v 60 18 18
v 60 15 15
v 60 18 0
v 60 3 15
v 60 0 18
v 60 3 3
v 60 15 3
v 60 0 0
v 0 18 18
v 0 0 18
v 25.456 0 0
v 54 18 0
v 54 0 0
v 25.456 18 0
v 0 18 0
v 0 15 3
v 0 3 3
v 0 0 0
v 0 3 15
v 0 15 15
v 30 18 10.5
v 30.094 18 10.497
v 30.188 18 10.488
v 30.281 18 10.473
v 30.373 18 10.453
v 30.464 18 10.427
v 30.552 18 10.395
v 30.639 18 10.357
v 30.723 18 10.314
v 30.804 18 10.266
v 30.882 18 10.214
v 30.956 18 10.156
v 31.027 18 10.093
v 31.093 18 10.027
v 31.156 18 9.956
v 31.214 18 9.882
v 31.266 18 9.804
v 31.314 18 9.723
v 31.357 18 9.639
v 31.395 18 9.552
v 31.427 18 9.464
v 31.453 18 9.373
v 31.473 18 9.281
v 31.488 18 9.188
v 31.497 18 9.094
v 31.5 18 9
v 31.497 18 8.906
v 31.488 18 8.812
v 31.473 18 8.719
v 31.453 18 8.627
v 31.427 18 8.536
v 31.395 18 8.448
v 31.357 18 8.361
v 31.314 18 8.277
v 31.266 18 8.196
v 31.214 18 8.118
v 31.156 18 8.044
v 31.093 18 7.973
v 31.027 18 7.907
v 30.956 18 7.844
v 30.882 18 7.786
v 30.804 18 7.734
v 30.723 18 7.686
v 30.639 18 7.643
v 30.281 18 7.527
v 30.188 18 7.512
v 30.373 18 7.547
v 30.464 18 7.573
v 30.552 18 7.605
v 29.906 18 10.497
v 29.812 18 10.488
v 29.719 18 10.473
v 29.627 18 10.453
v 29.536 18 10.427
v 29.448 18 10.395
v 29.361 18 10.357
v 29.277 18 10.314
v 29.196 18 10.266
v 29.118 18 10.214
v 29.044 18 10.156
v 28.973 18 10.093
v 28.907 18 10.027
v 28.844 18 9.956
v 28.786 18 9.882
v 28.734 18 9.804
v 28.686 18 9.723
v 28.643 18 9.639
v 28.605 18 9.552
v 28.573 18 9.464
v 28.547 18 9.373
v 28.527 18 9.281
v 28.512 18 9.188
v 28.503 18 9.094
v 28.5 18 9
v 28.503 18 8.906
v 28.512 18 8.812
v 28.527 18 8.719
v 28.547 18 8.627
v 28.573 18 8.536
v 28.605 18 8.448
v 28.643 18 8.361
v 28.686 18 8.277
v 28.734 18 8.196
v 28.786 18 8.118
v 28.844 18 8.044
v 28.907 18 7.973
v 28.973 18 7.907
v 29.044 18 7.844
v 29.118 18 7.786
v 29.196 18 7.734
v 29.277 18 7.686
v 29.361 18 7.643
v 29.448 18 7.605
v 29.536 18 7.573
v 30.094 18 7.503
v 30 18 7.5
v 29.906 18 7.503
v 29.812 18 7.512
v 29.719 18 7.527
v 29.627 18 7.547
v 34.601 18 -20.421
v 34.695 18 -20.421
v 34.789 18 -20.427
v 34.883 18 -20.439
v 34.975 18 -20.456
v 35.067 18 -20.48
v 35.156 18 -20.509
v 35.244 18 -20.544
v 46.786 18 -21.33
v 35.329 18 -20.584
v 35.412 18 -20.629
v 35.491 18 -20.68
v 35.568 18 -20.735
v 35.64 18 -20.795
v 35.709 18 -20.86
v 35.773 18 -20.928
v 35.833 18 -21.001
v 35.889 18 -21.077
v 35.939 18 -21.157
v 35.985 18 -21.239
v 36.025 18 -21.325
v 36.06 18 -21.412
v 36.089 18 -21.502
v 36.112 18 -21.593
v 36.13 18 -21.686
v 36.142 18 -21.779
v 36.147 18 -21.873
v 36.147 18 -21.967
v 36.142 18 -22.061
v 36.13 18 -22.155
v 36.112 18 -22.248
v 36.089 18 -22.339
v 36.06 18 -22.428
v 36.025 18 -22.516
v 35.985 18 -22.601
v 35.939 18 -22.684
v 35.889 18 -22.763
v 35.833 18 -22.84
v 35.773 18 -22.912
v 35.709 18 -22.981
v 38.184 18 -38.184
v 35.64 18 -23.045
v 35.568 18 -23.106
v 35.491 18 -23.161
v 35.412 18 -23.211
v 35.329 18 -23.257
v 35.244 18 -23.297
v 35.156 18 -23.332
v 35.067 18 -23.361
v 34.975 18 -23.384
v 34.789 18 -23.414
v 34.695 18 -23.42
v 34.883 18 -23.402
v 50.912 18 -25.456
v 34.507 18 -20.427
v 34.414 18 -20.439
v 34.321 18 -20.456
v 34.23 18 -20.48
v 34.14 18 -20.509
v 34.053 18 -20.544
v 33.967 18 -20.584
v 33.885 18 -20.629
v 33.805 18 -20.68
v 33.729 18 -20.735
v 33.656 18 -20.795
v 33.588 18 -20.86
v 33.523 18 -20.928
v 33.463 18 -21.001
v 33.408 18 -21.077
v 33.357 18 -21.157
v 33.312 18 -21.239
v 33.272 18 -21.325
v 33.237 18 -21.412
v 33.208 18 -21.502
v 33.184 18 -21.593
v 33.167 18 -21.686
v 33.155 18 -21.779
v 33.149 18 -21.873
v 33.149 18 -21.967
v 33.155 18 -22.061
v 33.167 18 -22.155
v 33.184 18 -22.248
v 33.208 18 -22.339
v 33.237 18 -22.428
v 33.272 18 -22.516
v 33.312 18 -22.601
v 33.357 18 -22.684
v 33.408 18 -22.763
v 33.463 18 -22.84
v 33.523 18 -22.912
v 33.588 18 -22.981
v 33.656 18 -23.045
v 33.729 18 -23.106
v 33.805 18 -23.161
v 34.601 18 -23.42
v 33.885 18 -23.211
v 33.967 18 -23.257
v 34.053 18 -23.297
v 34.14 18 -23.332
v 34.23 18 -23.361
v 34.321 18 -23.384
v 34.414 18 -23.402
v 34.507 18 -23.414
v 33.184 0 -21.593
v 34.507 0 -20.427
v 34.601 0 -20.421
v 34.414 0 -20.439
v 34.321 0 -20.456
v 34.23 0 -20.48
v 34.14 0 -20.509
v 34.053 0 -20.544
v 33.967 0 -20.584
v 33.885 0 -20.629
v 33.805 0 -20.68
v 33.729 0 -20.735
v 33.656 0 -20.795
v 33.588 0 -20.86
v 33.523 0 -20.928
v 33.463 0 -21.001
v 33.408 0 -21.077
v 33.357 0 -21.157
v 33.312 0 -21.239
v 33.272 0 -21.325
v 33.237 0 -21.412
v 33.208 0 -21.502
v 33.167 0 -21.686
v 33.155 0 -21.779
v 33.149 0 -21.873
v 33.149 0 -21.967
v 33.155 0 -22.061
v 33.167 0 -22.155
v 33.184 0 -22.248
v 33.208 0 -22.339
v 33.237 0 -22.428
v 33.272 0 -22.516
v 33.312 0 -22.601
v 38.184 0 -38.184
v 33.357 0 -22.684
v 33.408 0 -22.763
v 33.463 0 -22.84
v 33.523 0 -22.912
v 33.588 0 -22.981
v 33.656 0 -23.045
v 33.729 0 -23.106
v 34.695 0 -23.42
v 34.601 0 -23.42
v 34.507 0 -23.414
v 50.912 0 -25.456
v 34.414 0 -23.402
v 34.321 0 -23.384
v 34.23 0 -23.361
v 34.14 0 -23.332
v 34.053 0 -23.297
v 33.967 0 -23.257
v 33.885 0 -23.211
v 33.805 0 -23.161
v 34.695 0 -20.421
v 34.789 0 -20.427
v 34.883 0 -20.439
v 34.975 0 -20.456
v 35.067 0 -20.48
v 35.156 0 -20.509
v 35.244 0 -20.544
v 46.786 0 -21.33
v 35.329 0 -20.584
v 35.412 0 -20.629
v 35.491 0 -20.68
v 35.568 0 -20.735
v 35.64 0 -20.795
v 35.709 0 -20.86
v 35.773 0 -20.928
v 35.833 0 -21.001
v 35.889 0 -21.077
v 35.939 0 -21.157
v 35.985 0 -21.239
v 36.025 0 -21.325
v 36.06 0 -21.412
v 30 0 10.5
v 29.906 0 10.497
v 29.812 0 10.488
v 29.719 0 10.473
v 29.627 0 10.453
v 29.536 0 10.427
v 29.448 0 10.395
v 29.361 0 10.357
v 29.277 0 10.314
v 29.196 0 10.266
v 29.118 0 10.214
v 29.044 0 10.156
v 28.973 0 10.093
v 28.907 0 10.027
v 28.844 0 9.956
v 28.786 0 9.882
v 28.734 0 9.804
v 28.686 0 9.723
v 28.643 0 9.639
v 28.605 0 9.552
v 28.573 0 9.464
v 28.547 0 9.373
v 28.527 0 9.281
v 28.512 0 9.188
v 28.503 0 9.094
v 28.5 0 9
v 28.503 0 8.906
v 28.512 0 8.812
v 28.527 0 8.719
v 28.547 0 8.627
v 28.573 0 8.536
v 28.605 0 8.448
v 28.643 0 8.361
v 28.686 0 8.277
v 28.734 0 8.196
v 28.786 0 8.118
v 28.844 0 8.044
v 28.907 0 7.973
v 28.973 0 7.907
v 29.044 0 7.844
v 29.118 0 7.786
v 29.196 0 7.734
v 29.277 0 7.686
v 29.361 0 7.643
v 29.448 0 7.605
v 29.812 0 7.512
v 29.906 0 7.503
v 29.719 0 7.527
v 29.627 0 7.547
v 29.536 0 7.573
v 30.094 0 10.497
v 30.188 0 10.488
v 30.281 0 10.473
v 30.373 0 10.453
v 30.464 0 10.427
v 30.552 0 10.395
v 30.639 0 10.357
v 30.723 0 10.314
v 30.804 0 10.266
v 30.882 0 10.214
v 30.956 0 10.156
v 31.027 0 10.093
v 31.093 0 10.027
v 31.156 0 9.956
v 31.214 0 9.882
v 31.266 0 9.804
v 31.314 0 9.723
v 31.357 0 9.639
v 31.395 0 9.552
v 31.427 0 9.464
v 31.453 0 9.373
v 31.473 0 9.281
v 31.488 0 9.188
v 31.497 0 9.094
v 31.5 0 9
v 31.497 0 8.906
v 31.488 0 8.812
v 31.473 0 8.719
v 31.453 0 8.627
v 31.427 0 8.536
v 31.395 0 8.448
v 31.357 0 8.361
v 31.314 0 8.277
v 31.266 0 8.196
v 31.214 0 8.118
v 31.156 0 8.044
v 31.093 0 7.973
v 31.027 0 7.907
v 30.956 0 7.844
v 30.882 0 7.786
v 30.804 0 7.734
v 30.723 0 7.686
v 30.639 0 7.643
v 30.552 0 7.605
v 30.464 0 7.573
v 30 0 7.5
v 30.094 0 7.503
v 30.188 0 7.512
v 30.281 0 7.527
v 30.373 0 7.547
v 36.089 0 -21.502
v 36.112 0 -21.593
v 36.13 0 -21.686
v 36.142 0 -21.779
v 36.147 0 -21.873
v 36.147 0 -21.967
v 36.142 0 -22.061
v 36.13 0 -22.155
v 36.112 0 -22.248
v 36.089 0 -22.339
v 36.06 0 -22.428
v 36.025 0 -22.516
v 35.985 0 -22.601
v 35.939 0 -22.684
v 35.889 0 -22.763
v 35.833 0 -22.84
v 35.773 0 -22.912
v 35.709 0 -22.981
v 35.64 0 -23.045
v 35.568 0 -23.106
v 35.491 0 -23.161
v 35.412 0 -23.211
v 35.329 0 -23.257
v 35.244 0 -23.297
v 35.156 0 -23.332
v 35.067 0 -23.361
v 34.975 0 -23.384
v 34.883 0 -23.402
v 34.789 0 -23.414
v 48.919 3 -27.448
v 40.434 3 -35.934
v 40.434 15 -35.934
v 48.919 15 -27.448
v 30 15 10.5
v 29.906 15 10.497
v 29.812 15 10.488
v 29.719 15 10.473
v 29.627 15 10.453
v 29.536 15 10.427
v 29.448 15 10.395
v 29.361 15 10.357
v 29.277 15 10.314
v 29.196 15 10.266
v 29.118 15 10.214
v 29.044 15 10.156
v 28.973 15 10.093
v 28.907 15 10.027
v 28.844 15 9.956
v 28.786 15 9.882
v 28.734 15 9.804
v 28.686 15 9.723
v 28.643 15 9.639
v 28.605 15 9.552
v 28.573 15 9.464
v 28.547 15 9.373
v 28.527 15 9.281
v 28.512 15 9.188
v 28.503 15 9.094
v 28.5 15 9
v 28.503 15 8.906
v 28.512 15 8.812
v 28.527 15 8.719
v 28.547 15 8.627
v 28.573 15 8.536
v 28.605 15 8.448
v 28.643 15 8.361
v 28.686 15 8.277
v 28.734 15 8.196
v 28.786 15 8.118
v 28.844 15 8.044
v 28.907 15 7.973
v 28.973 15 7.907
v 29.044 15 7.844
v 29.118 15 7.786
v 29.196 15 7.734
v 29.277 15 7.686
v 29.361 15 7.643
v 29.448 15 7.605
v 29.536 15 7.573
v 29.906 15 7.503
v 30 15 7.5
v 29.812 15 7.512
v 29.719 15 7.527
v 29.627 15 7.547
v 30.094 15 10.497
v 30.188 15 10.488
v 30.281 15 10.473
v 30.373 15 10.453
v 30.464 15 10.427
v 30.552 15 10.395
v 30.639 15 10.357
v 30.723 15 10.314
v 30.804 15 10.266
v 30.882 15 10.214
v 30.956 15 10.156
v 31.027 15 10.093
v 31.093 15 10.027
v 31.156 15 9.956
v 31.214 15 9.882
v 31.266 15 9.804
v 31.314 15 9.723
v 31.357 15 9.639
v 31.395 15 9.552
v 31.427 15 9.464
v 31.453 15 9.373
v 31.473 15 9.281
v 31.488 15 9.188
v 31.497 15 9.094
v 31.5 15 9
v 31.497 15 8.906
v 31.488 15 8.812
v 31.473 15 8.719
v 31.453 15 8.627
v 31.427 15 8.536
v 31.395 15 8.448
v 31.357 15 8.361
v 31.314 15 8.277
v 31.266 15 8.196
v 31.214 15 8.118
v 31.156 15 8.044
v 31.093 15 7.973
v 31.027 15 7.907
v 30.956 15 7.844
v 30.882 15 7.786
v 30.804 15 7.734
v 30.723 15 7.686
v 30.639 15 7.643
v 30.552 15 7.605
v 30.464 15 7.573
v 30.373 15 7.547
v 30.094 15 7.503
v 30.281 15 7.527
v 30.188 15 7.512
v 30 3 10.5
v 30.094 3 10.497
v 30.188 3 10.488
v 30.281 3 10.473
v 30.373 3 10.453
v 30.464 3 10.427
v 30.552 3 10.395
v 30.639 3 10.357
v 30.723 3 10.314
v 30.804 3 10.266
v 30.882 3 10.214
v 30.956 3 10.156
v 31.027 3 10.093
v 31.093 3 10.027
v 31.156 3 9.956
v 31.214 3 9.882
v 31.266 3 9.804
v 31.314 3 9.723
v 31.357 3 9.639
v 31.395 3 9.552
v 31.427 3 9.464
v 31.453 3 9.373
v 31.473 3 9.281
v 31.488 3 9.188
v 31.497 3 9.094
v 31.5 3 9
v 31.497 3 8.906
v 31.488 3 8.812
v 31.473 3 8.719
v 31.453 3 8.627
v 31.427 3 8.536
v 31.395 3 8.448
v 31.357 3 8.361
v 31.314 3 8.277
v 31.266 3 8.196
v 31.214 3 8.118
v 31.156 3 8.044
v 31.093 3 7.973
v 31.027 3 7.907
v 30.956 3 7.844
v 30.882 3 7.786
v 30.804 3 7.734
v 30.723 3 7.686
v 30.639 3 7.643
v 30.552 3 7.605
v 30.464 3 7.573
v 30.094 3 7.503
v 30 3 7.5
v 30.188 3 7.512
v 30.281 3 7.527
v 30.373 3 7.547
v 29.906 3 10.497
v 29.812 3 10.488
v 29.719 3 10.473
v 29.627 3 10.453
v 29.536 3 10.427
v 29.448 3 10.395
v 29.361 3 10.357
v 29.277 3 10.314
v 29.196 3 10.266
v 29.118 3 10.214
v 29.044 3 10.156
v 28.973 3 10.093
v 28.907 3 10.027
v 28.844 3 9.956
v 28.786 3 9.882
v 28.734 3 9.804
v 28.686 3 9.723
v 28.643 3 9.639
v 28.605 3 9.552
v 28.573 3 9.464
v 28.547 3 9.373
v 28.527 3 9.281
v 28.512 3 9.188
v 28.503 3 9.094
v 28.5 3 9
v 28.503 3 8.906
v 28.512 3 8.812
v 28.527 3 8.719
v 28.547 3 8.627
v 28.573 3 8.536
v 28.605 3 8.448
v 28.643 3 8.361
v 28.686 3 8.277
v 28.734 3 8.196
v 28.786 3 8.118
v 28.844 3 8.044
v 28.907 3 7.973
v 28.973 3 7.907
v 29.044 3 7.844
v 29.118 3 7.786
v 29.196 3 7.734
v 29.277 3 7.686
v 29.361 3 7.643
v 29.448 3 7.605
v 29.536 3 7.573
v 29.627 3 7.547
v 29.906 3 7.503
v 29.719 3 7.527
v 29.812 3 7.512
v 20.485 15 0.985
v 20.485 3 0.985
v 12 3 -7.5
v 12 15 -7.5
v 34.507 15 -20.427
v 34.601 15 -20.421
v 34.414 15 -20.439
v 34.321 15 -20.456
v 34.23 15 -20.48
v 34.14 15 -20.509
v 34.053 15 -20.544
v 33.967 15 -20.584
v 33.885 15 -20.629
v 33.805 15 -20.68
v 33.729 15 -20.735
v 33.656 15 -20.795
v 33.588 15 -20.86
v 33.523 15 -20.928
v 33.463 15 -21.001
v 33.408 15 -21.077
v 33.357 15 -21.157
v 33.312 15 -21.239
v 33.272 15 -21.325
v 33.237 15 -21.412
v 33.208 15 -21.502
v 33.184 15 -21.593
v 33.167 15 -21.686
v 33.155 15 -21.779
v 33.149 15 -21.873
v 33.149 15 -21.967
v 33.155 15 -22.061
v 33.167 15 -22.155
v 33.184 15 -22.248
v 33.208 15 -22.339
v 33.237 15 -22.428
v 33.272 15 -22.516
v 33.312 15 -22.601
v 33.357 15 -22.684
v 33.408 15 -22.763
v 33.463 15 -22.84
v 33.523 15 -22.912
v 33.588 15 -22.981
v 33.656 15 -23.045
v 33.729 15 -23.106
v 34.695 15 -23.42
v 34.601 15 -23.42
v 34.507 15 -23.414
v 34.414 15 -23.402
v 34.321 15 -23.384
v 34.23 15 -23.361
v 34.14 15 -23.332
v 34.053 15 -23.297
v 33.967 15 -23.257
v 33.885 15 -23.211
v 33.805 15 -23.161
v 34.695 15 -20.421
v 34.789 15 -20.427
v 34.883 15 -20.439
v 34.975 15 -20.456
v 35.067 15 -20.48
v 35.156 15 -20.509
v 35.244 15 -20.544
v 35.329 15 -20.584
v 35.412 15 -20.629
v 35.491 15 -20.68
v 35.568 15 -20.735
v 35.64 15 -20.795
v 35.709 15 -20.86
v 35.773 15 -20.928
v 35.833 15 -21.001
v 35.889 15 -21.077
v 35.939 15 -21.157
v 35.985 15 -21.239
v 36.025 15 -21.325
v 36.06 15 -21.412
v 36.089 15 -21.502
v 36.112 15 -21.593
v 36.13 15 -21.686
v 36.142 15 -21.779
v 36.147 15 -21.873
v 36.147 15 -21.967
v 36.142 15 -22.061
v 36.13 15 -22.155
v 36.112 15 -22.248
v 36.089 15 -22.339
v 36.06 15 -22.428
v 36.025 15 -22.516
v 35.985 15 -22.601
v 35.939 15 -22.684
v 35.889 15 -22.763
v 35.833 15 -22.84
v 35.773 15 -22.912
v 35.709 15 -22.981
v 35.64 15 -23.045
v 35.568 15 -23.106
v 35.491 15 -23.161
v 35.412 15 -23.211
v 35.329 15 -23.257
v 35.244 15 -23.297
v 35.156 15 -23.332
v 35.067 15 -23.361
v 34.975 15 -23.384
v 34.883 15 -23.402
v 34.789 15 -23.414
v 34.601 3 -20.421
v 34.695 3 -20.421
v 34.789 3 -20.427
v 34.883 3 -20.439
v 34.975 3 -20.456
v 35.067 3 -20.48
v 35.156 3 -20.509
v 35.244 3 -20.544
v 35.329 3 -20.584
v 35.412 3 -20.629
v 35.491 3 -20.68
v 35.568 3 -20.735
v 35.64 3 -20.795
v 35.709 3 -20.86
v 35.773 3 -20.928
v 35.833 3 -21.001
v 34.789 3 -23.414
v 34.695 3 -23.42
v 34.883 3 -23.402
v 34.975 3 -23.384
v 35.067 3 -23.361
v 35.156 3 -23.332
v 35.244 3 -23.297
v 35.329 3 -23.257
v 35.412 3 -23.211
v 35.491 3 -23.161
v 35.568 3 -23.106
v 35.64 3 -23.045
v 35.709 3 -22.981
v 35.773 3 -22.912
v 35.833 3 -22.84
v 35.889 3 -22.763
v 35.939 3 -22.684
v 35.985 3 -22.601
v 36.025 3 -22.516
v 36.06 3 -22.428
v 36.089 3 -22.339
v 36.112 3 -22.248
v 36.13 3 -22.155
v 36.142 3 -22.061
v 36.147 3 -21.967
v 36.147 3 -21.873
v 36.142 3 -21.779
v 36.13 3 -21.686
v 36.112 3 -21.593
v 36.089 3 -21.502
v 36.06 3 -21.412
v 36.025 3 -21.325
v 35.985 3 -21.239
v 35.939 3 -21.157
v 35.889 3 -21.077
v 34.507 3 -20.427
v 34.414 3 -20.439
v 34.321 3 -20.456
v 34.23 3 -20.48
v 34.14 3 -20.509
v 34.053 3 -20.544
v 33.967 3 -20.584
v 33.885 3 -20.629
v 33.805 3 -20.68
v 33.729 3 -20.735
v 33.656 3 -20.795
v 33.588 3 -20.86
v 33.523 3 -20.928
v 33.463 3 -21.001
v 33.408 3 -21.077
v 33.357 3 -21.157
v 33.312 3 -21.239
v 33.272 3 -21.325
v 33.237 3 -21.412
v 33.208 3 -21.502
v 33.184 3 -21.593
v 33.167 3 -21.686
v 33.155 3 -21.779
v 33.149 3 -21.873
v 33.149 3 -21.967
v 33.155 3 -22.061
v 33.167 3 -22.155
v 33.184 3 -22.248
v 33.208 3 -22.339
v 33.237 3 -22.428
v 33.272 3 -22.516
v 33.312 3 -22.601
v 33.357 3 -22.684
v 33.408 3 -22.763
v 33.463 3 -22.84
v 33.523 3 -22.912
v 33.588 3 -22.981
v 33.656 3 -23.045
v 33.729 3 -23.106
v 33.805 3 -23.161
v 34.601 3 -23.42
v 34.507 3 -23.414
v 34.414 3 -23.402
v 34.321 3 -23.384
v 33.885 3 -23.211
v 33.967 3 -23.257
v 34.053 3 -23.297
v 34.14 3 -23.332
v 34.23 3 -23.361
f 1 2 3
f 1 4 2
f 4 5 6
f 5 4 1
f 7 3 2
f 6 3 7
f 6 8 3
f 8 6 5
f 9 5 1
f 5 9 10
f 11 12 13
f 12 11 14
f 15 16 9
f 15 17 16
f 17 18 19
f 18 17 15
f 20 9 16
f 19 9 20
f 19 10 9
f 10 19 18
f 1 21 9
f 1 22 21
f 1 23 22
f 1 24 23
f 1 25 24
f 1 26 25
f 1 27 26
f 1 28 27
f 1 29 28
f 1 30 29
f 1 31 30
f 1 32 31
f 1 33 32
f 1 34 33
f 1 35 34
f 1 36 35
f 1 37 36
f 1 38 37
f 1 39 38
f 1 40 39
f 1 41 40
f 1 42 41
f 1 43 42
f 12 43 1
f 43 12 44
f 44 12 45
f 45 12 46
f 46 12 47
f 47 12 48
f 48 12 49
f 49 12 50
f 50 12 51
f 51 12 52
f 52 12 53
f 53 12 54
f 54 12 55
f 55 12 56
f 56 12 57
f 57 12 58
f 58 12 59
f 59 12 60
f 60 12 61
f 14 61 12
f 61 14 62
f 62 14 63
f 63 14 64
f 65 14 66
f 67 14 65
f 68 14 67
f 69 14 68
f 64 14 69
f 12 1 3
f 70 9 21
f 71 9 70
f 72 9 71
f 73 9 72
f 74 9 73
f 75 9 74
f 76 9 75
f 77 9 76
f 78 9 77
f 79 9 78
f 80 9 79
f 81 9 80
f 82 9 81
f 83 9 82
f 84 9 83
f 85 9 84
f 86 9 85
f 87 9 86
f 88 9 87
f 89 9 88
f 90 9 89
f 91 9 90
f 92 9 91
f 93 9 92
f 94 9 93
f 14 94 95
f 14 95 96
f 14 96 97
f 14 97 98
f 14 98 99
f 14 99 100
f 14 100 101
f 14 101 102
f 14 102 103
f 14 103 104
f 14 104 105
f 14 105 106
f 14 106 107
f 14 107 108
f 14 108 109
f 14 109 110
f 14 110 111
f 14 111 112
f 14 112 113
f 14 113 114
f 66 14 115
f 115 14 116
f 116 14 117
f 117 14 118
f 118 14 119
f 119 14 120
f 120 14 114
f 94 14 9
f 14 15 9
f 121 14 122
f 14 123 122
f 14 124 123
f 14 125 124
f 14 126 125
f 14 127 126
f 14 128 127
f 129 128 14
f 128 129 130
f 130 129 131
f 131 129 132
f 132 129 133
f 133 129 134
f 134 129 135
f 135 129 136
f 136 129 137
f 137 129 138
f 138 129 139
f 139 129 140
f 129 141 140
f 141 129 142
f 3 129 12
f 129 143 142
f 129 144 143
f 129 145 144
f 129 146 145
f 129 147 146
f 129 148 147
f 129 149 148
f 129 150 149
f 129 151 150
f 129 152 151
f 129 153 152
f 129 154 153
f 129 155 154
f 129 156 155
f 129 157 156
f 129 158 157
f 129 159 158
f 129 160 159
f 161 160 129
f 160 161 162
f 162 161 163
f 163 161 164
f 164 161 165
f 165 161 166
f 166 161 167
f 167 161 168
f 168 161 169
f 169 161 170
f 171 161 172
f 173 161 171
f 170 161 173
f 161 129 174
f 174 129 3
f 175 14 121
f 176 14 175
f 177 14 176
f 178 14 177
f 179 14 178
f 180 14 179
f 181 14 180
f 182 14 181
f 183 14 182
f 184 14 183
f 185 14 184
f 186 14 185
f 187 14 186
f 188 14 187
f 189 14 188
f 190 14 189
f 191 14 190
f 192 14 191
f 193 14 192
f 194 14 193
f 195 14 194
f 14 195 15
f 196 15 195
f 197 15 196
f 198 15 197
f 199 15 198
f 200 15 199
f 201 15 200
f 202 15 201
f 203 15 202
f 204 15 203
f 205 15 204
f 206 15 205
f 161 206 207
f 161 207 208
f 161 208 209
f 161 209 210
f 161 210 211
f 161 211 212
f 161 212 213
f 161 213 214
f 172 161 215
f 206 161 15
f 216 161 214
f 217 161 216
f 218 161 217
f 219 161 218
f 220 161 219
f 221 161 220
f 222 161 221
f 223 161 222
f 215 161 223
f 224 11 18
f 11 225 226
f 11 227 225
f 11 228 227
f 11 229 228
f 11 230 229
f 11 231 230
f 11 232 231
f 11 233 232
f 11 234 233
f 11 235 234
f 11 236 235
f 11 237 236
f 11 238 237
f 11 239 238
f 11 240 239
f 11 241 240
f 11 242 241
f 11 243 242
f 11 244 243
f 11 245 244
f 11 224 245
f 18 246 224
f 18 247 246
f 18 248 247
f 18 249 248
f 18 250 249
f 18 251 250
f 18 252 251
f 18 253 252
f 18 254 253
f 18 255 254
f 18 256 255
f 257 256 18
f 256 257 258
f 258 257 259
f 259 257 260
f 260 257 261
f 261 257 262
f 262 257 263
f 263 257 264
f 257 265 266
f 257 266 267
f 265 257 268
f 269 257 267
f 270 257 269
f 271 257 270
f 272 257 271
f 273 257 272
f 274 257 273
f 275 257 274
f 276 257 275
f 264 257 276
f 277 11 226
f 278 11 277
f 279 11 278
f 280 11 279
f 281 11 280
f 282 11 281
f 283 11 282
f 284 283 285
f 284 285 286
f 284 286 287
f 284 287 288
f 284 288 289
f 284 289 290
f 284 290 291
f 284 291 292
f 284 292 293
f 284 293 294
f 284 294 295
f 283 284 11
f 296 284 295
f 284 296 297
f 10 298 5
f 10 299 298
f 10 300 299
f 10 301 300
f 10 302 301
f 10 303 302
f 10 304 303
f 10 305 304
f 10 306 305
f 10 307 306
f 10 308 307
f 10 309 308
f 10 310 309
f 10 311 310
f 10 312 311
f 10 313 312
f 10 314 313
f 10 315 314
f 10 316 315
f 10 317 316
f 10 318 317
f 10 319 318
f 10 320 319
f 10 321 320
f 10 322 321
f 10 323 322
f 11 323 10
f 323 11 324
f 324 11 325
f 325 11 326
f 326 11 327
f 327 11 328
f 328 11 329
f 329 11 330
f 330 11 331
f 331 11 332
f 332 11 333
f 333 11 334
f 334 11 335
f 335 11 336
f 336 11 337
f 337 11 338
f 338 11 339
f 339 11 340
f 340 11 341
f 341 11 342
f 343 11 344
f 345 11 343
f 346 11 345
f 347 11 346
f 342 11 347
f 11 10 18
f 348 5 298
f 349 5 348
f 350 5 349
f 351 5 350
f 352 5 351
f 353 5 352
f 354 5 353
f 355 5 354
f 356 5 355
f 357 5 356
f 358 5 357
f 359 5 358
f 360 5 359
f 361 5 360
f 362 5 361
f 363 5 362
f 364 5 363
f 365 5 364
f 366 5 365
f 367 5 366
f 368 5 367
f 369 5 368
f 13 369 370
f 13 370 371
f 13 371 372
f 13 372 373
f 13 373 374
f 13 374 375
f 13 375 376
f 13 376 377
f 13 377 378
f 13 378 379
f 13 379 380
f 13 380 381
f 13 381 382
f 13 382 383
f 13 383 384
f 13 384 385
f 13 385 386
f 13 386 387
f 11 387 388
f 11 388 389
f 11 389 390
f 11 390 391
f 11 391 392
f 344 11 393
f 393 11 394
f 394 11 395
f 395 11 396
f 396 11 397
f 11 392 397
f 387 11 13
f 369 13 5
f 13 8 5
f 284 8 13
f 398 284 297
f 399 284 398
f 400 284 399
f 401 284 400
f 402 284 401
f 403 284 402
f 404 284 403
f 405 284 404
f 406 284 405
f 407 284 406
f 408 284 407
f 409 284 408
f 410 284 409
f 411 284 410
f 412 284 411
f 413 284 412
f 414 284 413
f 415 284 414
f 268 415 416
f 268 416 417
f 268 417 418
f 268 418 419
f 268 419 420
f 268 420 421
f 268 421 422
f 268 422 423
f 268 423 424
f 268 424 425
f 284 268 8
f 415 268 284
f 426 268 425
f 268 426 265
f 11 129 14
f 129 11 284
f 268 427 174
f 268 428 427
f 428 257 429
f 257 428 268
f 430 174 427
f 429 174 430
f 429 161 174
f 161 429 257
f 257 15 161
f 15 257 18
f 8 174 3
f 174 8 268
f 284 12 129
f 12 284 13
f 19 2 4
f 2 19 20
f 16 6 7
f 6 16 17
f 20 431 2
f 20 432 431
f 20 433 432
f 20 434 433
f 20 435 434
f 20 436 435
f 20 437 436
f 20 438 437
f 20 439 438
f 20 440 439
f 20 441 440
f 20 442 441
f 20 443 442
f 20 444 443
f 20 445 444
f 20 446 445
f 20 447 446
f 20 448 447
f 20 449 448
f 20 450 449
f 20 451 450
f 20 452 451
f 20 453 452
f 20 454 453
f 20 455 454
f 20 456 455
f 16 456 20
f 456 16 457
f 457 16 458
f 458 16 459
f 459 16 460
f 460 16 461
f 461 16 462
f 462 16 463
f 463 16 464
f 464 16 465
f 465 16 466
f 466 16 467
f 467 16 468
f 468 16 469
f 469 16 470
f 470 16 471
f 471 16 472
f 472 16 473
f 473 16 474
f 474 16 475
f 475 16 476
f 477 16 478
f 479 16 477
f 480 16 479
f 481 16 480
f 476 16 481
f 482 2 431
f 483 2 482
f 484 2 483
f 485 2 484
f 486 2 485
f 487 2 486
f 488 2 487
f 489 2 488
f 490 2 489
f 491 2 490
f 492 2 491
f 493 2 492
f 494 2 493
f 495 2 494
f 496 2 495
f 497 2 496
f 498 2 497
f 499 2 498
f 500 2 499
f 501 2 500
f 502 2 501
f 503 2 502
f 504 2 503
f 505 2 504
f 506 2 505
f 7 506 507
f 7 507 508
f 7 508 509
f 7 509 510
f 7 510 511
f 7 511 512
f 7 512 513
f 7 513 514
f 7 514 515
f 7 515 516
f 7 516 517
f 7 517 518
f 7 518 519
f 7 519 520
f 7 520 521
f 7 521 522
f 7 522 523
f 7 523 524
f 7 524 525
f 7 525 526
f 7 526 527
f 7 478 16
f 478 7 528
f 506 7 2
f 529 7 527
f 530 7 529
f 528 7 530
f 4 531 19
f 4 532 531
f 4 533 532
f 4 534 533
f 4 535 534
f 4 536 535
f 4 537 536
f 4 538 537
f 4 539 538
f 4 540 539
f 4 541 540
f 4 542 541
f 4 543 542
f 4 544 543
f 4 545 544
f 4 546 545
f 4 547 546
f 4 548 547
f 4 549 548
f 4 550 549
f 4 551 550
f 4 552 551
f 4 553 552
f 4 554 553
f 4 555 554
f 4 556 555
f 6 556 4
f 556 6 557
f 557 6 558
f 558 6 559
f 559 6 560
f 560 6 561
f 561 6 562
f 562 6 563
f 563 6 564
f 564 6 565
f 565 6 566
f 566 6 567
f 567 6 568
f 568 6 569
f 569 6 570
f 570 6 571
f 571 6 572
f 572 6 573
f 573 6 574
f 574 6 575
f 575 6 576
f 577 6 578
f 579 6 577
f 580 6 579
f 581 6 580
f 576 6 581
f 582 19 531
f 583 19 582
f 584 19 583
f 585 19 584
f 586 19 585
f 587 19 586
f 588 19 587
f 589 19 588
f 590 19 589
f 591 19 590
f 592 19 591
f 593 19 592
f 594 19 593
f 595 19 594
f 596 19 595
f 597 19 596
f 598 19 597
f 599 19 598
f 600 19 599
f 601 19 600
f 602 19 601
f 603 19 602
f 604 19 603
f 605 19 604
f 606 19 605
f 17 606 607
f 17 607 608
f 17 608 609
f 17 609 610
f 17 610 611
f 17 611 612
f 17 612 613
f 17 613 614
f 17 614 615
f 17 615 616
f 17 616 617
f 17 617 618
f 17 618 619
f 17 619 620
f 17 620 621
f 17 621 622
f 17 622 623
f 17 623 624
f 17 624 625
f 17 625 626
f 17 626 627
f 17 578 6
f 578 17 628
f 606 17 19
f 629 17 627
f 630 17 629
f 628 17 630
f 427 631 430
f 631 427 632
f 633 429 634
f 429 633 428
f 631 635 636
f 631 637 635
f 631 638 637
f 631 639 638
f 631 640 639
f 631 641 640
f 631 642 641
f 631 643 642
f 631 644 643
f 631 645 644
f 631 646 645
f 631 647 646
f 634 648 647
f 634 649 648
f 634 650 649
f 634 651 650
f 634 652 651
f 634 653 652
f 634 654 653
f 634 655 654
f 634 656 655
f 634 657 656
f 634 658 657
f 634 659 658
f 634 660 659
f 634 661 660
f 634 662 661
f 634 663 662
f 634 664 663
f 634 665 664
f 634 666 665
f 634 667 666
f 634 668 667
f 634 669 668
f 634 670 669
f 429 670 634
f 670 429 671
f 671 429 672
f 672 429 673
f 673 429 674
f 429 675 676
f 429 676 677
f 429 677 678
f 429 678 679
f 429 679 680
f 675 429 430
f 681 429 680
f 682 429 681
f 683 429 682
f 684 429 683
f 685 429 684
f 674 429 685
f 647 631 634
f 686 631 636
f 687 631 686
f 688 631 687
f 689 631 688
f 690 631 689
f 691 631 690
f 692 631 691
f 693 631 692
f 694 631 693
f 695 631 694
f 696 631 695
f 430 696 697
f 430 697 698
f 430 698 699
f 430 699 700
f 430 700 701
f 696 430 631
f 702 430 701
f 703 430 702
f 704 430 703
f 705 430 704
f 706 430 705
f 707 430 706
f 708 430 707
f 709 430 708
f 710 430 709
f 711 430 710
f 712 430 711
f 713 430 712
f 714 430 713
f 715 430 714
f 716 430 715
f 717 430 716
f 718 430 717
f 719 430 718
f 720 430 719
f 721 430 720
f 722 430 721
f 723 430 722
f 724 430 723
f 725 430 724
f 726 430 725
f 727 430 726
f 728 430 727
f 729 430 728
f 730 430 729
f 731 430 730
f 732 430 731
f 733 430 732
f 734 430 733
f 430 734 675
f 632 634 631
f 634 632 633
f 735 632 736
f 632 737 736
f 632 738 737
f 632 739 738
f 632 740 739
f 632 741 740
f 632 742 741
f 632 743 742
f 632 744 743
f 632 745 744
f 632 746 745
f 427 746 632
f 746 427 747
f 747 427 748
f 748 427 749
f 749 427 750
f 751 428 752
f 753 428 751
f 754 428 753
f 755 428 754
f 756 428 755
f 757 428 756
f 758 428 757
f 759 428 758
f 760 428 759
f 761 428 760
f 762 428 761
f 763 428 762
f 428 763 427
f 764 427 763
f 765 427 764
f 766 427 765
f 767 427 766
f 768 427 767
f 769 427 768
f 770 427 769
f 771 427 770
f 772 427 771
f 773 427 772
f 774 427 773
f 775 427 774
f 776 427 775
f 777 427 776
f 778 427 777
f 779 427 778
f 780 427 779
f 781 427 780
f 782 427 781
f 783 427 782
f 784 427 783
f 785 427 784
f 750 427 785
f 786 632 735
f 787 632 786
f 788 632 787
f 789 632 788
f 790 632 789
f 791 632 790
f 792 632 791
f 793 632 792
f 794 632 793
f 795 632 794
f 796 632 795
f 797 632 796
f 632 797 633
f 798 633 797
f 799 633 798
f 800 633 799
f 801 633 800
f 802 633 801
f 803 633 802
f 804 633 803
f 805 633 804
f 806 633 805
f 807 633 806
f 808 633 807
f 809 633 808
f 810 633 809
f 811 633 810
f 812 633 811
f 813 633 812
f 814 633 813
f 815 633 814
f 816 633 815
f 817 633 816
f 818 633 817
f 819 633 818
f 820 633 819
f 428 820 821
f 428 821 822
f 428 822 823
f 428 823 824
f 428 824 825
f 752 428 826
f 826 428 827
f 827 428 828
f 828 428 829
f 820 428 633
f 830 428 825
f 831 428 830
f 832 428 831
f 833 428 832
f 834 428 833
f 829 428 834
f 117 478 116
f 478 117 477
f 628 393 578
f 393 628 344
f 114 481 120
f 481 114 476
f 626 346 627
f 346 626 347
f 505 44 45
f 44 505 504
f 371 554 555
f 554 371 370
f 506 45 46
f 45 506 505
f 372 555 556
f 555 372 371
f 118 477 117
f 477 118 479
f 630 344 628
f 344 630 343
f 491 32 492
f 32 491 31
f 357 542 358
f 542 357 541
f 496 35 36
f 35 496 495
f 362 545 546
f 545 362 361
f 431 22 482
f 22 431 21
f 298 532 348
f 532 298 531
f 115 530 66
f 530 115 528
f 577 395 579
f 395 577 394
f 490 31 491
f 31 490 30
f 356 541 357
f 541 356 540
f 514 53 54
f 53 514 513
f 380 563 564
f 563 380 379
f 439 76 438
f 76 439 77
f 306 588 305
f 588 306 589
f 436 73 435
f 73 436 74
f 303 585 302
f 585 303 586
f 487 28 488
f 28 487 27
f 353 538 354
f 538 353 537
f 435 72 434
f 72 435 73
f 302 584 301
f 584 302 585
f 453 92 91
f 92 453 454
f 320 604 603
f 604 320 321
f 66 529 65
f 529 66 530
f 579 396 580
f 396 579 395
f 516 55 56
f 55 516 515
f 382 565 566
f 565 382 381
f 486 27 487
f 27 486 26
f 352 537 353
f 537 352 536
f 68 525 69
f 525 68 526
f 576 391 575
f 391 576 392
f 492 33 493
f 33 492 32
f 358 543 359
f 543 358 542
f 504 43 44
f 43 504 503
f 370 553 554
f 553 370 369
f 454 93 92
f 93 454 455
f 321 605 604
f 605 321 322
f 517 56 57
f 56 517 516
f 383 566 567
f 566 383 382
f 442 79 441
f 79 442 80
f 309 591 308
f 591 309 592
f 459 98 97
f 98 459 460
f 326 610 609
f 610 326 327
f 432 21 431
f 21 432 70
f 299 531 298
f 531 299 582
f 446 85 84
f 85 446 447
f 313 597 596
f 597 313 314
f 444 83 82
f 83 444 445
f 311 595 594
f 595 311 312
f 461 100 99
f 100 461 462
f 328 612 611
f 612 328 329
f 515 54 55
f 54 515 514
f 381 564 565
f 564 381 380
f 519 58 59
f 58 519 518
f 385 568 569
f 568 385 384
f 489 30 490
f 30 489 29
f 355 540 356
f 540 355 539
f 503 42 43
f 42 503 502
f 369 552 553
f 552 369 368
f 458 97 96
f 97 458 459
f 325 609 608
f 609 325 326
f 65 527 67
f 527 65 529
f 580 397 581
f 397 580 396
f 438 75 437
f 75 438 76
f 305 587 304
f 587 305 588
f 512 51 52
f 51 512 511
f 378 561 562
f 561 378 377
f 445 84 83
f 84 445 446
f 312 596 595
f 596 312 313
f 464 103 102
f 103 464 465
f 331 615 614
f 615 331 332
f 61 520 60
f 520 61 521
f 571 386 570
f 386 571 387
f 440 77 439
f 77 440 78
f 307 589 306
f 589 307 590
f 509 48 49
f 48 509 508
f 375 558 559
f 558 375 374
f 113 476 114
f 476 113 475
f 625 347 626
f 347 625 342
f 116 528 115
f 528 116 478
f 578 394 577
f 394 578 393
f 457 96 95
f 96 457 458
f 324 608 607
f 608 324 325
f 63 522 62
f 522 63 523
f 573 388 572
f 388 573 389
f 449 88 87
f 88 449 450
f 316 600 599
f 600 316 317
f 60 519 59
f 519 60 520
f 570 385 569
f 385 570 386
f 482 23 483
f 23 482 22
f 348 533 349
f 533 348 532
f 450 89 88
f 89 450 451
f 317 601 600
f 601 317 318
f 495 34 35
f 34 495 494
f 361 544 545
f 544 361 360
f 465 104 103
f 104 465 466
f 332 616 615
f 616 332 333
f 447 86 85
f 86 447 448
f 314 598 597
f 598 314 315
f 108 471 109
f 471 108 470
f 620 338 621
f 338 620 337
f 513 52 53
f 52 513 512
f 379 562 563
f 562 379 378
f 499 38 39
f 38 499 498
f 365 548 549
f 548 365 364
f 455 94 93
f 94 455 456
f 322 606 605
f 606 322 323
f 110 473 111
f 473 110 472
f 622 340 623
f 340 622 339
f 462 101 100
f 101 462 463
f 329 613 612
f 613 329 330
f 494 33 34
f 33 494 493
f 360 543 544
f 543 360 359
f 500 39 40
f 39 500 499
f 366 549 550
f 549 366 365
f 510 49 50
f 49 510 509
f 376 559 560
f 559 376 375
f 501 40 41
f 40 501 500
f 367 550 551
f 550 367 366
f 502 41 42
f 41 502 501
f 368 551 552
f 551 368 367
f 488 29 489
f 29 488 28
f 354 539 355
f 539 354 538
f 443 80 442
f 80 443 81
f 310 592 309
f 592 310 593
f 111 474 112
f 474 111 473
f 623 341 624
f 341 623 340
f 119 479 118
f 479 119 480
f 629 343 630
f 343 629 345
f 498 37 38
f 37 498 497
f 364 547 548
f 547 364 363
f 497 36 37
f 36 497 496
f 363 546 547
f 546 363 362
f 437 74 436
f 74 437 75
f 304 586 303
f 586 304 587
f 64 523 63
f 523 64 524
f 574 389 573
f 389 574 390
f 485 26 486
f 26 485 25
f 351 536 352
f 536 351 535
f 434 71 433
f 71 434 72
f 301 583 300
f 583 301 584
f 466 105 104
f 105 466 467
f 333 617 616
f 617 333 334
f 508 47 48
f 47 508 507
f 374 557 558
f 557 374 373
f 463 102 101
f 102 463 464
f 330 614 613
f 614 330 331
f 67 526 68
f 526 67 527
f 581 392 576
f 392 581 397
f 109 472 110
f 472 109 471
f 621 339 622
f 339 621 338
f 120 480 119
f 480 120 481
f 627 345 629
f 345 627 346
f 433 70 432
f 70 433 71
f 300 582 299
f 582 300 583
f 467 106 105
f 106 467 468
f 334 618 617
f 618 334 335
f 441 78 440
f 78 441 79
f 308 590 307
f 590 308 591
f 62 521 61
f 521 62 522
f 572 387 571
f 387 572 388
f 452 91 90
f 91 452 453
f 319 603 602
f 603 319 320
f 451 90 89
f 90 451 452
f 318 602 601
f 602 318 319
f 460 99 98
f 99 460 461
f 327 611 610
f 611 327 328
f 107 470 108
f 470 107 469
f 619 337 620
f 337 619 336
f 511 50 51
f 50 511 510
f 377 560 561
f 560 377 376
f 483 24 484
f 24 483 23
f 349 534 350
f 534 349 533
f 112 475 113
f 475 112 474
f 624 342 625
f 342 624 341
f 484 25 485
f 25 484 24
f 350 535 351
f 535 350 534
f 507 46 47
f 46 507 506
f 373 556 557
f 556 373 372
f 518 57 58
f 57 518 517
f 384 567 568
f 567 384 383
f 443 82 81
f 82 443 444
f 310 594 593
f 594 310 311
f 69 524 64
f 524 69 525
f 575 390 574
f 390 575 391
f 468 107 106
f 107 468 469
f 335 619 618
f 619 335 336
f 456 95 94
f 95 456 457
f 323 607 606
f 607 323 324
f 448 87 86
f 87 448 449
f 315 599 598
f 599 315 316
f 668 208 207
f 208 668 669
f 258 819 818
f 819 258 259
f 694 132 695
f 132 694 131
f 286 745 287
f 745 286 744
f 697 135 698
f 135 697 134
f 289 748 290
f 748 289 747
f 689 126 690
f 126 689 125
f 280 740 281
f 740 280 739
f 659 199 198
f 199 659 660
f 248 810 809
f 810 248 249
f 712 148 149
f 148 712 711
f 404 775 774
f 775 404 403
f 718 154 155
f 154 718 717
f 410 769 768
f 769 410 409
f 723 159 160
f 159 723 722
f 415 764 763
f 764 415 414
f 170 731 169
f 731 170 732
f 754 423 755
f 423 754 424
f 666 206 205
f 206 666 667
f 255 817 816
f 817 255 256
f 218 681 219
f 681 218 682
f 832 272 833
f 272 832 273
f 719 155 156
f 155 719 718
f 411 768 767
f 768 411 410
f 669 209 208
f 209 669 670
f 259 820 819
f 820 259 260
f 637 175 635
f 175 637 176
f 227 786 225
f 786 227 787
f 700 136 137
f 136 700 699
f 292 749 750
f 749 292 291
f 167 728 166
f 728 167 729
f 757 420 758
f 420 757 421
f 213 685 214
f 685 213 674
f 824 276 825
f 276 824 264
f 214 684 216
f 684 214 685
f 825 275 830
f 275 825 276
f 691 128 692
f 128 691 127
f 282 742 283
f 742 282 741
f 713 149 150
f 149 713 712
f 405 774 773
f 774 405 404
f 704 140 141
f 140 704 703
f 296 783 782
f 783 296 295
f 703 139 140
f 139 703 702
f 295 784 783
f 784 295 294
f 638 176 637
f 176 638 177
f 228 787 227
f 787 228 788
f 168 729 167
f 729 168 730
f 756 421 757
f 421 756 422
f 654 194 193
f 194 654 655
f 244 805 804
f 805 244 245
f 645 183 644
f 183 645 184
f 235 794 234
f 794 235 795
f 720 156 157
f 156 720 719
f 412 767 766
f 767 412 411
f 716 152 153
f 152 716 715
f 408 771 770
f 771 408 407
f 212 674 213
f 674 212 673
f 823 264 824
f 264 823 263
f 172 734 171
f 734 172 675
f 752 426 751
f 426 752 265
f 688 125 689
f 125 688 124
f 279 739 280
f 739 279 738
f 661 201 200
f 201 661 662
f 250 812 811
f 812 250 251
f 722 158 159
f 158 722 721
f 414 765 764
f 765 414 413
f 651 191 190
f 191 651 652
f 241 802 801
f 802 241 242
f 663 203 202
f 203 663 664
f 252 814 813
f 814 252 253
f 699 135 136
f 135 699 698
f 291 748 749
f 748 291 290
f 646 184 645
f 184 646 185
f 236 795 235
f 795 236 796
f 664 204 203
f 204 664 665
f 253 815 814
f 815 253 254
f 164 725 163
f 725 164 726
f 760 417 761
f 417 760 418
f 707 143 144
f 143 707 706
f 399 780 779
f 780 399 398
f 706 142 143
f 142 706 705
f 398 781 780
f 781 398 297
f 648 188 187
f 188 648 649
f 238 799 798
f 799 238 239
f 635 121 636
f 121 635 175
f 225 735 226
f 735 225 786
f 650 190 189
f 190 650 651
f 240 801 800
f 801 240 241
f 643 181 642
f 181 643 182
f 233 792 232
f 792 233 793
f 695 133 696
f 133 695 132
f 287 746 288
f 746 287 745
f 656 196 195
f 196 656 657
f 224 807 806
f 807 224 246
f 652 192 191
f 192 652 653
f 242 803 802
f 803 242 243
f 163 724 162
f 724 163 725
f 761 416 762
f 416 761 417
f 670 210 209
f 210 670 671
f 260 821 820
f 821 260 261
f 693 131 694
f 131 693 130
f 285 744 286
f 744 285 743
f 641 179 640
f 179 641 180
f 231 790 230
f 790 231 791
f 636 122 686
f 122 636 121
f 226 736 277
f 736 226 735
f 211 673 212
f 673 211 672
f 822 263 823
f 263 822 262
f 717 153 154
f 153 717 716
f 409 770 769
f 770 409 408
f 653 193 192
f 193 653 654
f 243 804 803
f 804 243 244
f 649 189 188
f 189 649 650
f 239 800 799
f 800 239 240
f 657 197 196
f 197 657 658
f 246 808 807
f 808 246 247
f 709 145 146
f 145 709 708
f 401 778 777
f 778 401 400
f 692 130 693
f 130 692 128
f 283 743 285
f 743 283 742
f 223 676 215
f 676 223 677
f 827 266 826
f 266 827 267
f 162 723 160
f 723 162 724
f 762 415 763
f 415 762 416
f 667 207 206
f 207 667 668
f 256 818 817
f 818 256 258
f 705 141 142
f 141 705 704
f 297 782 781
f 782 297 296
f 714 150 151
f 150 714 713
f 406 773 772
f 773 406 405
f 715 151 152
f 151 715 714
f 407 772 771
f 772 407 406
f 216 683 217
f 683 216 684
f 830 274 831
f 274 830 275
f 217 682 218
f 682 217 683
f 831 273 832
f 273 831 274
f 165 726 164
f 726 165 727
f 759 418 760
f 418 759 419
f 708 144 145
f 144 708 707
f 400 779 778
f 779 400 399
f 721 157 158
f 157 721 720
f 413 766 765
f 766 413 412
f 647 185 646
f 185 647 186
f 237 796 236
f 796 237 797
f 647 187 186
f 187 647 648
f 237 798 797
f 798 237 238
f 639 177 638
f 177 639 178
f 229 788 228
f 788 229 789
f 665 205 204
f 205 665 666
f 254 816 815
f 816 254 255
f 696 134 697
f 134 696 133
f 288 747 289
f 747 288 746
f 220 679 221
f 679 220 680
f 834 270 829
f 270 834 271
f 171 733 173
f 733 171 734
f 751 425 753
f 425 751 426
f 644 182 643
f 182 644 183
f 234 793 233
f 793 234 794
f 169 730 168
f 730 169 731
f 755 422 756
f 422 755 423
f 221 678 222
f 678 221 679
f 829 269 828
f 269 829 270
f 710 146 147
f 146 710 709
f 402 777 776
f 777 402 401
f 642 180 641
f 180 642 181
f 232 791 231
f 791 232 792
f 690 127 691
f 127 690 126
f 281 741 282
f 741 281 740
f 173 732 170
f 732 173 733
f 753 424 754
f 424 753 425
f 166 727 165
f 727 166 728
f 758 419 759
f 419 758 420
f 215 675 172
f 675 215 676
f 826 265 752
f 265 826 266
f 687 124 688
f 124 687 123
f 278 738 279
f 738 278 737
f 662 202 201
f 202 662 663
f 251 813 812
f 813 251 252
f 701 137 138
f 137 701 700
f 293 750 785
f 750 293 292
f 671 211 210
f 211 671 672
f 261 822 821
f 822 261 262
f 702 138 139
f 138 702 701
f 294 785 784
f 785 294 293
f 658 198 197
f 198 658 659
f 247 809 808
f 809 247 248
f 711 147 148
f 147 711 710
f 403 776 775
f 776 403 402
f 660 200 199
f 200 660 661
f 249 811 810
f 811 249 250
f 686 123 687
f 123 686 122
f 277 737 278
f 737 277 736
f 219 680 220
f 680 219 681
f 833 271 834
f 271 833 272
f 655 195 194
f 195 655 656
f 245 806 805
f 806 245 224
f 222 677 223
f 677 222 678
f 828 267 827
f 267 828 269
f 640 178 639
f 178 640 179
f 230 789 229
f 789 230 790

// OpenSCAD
// [FL_INDEX: keywords="openscad, 3d_parametric, RotorPrint_-_Landing_gear_adapter, csg_solid" | COT="Parametric OpenSCAD design from 3DCodeverse"]
// Title: RotorPrint - Landing gear adapter

/**
 *
 * RotorPrint, customizable landing gear adapter
 * Made by Dave de Fijter - 2013
 *
**/

// preview[view:south east, tilt:side]

/* [Global] */

what_part = "adapter"; // [adapter, stopper]

// The length of the landing gear part, the longer the more rigid
shaft_length = 60;

// The inner diameter of the part, should be about the same as the outer diameter of your tubes.
inner_diameter = 12;

// The thickness of the walls, the thicker the stronger, but might look very bulky if you overdo this.
wall_thickness = 3;

// The diameter of the screw hole, use 0 for no holes
screw_diameter = 3;

/* [Hidden] */

$fn = 100;

choose_part();

module choose_part() {

	if(what_part == "adapter") {
		adapter();
	} else {
		landing();
	}
}

module landing() {
	difference() {
		union() {
			difference() {
				cube([shaft_length+inner_diameter*2, inner_diameter + 2*wall_thickness, inner_diameter + 2*wall_thickness]);
				
				translate([0-wall_thickness, wall_thickness, wall_thickness]) {
					cube([shaft_length+wall_thickness, inner_diameter, inner_diameter]);
				}
			}
			
			difference() {
			
				translate([shaft_length+inner_diameter*1.0, wall_thickness + (inner_diameter/2),  wall_thickness + (inner_diameter/2)]) {
					sphere(r=inner_diameter*1.5);
				}
	
				translate([shaft_length + inner_diameter*1.0, wall_thickness + (inner_diameter / 2),  wall_thickness + (inner_diameter / 2)]) {
					rotate([0, 45, 0]) {
						translate([-1.5*inner_diameter, 0, 0]) {
							cube(inner_diameter*3, center=true);
						}
					}
				}	
	
				
			}
	
		}
		
		if(screw_diameter > 0) {
			translate([shaft_length / 2, inner_diameter + (3*wall_thickness), wall_thickness+(inner_diameter/2)]) {
				rotate(90, [1, 0, 0]) {
					cylinder(r=screw_diameter/2, h=(inner_diameter + (4 * wall_thickness)));
				}
			}
		}
	}
}

module adapter() {
	difference() {
		difference() {
			
			union() {
				difference() {
				
					difference() {
						hull() {  outlines(false); }
						outlines(false);
					}
					translate([0, -1, 0]) {
						scale([0.9, 1.1, 0.95]) {
							difference() {
								hull() {  outlines(false); }
								outlines(false);
							}
						}
					}
				}
				
				
				
				difference() {
					outlines(false);
					outlines(true);
				}
			}
			
			
			union() {
		
				if(screw_diameter > 0) {
					translate([shaft_length / 2, inner_diameter + (3*wall_thickness), wall_thickness+(inner_diameter/2)]) {
						rotate(90, [1, 0, 0]) {
							cylinder(r=screw_diameter/2, h=(inner_diameter + (4 * wall_thickness)));
						}
					}
					
					rotate(45, [0, 1, 0]) {
						translate([shaft_length / 1.5, inner_diameter + (3*wall_thickness), wall_thickness+(inner_diameter/2)]) {
							rotate(90, [1, 0, 0]) {
								cylinder(r=screw_diameter/2, h=(inner_diameter + (4 * wall_thickness)));
							}
						}
				}
				}
		}
		}
		
		outlines(true);
	
	}
}

module outlines(render_inner) {

if(render_inner) {

		translate([-5, wall_thickness, wall_thickness]) {
			cube([shaft_length + 50, inner_diameter, inner_diameter]);
		}
	
	
		translate([0 + inner_diameter, wall_thickness, (wall_thickness + wall_thickness/2) - inner_diameter]) {
			rotate(45, [0, 1, 0]) {
				cube([shaft_length + 15, inner_diameter, inner_diameter]);			
			}
		}

} else {
	cube([shaft_length, inner_diameter + wall_thickness*2, inner_diameter + wall_thickness*2]);

	translate([0, 0, 0]) {
		rotate(45, [0, 1, 0]) {
			cube([shaft_length-wall_thickness*2, inner_diameter + wall_thickness*2, inner_diameter + wall_thickness*2]);
		}	
	}
}


}


//cube(inner_diameter + wall_thickness
